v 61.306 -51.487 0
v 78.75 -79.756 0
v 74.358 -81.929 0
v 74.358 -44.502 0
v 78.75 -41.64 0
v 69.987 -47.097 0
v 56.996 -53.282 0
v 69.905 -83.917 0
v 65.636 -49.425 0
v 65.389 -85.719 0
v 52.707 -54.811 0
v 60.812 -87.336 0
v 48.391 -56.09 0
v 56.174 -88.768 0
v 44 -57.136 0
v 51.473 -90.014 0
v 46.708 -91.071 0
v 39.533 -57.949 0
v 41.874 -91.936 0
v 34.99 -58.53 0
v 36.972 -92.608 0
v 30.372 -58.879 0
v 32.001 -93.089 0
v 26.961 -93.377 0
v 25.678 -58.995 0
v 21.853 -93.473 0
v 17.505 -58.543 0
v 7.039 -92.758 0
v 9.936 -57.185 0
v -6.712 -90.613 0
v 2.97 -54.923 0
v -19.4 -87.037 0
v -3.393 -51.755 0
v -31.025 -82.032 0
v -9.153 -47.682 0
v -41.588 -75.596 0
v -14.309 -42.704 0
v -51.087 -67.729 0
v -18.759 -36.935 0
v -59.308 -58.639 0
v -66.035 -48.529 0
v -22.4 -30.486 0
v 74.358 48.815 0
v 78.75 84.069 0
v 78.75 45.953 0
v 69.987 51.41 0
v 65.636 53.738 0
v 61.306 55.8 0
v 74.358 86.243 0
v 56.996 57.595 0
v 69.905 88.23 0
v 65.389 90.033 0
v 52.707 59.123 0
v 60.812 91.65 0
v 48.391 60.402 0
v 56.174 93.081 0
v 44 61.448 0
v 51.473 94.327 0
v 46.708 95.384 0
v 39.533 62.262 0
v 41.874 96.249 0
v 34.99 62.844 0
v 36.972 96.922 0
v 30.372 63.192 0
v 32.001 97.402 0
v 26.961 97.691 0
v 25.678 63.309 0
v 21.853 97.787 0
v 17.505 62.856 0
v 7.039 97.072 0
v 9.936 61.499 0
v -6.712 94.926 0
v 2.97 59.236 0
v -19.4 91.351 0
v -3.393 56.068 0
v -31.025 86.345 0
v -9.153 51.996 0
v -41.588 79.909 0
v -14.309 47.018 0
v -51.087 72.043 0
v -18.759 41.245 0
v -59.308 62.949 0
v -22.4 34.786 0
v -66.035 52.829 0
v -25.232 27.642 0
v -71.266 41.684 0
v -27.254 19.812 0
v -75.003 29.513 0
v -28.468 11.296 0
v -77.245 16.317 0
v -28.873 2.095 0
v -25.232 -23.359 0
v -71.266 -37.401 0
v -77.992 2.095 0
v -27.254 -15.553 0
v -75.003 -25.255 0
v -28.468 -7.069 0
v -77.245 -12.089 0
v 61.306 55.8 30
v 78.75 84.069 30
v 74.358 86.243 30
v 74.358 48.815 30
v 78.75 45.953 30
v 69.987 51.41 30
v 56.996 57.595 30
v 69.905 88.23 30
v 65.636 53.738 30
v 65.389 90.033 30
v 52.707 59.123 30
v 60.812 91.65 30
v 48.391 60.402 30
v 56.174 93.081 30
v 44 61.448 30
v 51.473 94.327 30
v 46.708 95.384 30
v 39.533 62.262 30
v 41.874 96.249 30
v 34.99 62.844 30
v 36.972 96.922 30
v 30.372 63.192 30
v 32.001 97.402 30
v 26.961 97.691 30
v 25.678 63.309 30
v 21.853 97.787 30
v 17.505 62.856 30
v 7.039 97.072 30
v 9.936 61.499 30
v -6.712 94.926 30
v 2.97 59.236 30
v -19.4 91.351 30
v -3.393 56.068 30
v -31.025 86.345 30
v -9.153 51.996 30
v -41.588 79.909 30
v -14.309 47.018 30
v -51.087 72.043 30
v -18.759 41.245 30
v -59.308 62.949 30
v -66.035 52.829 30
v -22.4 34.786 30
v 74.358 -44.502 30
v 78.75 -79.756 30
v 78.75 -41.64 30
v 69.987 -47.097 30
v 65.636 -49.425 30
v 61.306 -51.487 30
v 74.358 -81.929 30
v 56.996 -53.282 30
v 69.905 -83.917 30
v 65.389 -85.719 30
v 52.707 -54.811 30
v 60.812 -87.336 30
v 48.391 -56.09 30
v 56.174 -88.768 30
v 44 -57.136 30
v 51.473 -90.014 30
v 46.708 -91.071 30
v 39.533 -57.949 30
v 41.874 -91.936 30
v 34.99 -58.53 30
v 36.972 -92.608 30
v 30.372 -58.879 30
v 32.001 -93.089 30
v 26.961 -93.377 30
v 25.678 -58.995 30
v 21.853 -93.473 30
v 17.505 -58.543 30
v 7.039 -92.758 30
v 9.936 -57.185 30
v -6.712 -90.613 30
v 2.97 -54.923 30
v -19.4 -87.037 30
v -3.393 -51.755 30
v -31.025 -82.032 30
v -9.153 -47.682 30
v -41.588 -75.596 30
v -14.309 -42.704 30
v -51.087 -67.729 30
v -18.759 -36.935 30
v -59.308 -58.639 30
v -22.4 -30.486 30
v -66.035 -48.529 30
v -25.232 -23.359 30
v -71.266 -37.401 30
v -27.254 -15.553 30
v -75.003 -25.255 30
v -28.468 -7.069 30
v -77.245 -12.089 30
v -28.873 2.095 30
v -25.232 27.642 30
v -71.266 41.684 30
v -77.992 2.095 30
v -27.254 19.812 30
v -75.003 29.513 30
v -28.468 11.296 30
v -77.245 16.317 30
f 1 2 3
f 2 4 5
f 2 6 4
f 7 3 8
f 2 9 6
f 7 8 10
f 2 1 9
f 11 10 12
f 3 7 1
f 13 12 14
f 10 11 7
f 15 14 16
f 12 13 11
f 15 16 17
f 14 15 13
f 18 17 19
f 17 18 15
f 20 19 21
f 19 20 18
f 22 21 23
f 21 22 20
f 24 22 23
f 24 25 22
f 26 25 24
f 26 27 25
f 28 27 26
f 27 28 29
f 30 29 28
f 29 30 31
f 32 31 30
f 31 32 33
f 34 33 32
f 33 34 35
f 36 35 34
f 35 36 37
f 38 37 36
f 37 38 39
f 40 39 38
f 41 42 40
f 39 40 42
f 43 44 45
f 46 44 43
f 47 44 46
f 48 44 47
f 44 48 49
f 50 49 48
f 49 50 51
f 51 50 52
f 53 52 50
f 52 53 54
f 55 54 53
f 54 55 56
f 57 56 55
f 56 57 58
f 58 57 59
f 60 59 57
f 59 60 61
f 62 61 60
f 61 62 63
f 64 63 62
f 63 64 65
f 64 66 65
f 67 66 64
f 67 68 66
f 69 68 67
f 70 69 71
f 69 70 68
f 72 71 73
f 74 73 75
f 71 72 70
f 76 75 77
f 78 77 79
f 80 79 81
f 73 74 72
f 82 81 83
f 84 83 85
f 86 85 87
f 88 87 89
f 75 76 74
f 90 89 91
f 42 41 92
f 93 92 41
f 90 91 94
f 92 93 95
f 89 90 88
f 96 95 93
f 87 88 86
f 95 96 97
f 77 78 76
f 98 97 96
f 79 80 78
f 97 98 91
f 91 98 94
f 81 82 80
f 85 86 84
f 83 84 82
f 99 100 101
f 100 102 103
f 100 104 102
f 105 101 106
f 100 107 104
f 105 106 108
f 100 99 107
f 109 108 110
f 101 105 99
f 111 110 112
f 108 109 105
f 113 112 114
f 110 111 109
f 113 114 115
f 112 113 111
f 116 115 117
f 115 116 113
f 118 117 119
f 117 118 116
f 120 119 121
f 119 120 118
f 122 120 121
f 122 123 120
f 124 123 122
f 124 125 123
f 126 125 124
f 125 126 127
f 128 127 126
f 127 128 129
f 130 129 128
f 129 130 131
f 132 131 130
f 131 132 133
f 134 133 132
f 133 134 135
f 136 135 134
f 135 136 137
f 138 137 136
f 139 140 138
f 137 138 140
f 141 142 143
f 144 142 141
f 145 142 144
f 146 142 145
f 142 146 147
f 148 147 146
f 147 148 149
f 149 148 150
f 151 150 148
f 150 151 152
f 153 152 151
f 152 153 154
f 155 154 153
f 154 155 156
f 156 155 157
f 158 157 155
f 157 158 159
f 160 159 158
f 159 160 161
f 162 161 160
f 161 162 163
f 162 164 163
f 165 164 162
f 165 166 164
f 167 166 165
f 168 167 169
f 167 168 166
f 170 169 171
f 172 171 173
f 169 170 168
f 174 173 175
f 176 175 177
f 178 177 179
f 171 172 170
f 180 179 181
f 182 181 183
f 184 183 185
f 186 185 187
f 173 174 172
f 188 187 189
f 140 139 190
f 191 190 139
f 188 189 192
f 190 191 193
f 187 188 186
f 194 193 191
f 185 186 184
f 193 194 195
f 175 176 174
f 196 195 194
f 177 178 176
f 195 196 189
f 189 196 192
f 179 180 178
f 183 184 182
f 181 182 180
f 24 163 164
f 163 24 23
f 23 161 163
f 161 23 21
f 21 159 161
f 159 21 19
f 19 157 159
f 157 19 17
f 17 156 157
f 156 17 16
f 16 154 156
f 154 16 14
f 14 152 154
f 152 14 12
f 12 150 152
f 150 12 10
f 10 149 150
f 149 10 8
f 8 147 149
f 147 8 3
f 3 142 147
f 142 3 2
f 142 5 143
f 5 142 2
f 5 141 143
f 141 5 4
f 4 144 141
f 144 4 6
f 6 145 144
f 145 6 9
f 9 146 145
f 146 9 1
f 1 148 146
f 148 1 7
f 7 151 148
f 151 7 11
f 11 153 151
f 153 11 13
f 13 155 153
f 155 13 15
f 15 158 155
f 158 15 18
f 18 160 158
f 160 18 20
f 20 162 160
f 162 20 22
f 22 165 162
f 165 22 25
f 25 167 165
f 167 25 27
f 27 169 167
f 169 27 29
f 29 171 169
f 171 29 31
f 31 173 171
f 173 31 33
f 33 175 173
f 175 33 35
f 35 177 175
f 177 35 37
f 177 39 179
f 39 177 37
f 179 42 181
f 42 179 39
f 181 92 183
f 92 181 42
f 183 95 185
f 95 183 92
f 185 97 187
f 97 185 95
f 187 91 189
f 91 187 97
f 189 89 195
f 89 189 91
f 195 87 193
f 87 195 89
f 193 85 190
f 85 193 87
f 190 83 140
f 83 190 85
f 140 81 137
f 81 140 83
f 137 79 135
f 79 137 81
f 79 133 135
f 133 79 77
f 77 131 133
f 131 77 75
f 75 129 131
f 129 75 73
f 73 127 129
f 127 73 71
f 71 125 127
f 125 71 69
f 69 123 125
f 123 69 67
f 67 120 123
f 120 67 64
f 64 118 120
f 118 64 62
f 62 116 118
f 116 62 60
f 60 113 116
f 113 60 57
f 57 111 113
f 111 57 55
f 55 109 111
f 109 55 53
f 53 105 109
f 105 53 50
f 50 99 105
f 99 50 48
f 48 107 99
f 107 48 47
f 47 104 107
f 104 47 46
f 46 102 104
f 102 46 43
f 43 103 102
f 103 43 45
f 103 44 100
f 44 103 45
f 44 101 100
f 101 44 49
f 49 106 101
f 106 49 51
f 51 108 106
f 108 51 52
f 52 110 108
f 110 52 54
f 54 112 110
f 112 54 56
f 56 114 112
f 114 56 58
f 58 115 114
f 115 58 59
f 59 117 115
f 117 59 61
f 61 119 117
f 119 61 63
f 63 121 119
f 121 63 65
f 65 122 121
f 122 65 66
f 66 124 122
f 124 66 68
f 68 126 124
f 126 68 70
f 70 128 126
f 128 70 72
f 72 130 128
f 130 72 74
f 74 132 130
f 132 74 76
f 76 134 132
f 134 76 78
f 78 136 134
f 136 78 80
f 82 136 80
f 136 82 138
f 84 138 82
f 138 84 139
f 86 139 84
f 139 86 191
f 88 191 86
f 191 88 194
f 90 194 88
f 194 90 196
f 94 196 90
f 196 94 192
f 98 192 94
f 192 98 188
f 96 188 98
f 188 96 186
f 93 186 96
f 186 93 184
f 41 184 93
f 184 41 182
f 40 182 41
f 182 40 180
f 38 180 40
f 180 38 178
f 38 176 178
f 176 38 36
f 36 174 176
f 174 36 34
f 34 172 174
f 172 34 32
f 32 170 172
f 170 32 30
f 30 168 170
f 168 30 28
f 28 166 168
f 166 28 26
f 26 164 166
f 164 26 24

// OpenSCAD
// Logotipo COW AI - Letra C (Relieve 30mm)
// Diseñado para impresión en Bambu Lab P1S (Cara frontal hacia abajo en cama PEI)


$fn = 40;

// Keyhole hanger pocket for wall mounting (face-down printing: rear is at z=depth)
module keyhole_pocket(depth = 30) {
    translate([0, 0, depth - 7]) {
        // Screw head insertion pocket (9mm dia, 7.2mm deep)
        cylinder(d = 9.0, h = 7.2);
        
        // Internal slide channel for screw head (9mm wide, 12mm high, 4mm deep)
        translate([-4.5, 0, 0]) cube([9.0, 12.0, 4.0]);
        translate([0, 12, 0]) cylinder(d = 9.0, h = 4.0);
        
        // Screw shank slot to the wall surface (4.6mm wide, 12mm high, 3.2mm deep)
        translate([-2.3, 0, 4.0]) cube([4.6, 12.0, 3.2]);
        translate([0, 12, 4.0]) cylinder(d = 4.6, h = 3.2);
    }
}


difference() {
    // Letra extruida 30mm
    linear_extrude(height = 30, convexity = 10)
        text("C", font = "Ubuntu:style=Bold", size = 182, halign = "center", valign = "center");
        
    // Alojamientos traseros para anclaje a pared
    translate([0, 40, 0]) keyhole_pocket(depth = 30);
    translate([0, -40, 0]) keyhole_pocket(depth = 30);
}
